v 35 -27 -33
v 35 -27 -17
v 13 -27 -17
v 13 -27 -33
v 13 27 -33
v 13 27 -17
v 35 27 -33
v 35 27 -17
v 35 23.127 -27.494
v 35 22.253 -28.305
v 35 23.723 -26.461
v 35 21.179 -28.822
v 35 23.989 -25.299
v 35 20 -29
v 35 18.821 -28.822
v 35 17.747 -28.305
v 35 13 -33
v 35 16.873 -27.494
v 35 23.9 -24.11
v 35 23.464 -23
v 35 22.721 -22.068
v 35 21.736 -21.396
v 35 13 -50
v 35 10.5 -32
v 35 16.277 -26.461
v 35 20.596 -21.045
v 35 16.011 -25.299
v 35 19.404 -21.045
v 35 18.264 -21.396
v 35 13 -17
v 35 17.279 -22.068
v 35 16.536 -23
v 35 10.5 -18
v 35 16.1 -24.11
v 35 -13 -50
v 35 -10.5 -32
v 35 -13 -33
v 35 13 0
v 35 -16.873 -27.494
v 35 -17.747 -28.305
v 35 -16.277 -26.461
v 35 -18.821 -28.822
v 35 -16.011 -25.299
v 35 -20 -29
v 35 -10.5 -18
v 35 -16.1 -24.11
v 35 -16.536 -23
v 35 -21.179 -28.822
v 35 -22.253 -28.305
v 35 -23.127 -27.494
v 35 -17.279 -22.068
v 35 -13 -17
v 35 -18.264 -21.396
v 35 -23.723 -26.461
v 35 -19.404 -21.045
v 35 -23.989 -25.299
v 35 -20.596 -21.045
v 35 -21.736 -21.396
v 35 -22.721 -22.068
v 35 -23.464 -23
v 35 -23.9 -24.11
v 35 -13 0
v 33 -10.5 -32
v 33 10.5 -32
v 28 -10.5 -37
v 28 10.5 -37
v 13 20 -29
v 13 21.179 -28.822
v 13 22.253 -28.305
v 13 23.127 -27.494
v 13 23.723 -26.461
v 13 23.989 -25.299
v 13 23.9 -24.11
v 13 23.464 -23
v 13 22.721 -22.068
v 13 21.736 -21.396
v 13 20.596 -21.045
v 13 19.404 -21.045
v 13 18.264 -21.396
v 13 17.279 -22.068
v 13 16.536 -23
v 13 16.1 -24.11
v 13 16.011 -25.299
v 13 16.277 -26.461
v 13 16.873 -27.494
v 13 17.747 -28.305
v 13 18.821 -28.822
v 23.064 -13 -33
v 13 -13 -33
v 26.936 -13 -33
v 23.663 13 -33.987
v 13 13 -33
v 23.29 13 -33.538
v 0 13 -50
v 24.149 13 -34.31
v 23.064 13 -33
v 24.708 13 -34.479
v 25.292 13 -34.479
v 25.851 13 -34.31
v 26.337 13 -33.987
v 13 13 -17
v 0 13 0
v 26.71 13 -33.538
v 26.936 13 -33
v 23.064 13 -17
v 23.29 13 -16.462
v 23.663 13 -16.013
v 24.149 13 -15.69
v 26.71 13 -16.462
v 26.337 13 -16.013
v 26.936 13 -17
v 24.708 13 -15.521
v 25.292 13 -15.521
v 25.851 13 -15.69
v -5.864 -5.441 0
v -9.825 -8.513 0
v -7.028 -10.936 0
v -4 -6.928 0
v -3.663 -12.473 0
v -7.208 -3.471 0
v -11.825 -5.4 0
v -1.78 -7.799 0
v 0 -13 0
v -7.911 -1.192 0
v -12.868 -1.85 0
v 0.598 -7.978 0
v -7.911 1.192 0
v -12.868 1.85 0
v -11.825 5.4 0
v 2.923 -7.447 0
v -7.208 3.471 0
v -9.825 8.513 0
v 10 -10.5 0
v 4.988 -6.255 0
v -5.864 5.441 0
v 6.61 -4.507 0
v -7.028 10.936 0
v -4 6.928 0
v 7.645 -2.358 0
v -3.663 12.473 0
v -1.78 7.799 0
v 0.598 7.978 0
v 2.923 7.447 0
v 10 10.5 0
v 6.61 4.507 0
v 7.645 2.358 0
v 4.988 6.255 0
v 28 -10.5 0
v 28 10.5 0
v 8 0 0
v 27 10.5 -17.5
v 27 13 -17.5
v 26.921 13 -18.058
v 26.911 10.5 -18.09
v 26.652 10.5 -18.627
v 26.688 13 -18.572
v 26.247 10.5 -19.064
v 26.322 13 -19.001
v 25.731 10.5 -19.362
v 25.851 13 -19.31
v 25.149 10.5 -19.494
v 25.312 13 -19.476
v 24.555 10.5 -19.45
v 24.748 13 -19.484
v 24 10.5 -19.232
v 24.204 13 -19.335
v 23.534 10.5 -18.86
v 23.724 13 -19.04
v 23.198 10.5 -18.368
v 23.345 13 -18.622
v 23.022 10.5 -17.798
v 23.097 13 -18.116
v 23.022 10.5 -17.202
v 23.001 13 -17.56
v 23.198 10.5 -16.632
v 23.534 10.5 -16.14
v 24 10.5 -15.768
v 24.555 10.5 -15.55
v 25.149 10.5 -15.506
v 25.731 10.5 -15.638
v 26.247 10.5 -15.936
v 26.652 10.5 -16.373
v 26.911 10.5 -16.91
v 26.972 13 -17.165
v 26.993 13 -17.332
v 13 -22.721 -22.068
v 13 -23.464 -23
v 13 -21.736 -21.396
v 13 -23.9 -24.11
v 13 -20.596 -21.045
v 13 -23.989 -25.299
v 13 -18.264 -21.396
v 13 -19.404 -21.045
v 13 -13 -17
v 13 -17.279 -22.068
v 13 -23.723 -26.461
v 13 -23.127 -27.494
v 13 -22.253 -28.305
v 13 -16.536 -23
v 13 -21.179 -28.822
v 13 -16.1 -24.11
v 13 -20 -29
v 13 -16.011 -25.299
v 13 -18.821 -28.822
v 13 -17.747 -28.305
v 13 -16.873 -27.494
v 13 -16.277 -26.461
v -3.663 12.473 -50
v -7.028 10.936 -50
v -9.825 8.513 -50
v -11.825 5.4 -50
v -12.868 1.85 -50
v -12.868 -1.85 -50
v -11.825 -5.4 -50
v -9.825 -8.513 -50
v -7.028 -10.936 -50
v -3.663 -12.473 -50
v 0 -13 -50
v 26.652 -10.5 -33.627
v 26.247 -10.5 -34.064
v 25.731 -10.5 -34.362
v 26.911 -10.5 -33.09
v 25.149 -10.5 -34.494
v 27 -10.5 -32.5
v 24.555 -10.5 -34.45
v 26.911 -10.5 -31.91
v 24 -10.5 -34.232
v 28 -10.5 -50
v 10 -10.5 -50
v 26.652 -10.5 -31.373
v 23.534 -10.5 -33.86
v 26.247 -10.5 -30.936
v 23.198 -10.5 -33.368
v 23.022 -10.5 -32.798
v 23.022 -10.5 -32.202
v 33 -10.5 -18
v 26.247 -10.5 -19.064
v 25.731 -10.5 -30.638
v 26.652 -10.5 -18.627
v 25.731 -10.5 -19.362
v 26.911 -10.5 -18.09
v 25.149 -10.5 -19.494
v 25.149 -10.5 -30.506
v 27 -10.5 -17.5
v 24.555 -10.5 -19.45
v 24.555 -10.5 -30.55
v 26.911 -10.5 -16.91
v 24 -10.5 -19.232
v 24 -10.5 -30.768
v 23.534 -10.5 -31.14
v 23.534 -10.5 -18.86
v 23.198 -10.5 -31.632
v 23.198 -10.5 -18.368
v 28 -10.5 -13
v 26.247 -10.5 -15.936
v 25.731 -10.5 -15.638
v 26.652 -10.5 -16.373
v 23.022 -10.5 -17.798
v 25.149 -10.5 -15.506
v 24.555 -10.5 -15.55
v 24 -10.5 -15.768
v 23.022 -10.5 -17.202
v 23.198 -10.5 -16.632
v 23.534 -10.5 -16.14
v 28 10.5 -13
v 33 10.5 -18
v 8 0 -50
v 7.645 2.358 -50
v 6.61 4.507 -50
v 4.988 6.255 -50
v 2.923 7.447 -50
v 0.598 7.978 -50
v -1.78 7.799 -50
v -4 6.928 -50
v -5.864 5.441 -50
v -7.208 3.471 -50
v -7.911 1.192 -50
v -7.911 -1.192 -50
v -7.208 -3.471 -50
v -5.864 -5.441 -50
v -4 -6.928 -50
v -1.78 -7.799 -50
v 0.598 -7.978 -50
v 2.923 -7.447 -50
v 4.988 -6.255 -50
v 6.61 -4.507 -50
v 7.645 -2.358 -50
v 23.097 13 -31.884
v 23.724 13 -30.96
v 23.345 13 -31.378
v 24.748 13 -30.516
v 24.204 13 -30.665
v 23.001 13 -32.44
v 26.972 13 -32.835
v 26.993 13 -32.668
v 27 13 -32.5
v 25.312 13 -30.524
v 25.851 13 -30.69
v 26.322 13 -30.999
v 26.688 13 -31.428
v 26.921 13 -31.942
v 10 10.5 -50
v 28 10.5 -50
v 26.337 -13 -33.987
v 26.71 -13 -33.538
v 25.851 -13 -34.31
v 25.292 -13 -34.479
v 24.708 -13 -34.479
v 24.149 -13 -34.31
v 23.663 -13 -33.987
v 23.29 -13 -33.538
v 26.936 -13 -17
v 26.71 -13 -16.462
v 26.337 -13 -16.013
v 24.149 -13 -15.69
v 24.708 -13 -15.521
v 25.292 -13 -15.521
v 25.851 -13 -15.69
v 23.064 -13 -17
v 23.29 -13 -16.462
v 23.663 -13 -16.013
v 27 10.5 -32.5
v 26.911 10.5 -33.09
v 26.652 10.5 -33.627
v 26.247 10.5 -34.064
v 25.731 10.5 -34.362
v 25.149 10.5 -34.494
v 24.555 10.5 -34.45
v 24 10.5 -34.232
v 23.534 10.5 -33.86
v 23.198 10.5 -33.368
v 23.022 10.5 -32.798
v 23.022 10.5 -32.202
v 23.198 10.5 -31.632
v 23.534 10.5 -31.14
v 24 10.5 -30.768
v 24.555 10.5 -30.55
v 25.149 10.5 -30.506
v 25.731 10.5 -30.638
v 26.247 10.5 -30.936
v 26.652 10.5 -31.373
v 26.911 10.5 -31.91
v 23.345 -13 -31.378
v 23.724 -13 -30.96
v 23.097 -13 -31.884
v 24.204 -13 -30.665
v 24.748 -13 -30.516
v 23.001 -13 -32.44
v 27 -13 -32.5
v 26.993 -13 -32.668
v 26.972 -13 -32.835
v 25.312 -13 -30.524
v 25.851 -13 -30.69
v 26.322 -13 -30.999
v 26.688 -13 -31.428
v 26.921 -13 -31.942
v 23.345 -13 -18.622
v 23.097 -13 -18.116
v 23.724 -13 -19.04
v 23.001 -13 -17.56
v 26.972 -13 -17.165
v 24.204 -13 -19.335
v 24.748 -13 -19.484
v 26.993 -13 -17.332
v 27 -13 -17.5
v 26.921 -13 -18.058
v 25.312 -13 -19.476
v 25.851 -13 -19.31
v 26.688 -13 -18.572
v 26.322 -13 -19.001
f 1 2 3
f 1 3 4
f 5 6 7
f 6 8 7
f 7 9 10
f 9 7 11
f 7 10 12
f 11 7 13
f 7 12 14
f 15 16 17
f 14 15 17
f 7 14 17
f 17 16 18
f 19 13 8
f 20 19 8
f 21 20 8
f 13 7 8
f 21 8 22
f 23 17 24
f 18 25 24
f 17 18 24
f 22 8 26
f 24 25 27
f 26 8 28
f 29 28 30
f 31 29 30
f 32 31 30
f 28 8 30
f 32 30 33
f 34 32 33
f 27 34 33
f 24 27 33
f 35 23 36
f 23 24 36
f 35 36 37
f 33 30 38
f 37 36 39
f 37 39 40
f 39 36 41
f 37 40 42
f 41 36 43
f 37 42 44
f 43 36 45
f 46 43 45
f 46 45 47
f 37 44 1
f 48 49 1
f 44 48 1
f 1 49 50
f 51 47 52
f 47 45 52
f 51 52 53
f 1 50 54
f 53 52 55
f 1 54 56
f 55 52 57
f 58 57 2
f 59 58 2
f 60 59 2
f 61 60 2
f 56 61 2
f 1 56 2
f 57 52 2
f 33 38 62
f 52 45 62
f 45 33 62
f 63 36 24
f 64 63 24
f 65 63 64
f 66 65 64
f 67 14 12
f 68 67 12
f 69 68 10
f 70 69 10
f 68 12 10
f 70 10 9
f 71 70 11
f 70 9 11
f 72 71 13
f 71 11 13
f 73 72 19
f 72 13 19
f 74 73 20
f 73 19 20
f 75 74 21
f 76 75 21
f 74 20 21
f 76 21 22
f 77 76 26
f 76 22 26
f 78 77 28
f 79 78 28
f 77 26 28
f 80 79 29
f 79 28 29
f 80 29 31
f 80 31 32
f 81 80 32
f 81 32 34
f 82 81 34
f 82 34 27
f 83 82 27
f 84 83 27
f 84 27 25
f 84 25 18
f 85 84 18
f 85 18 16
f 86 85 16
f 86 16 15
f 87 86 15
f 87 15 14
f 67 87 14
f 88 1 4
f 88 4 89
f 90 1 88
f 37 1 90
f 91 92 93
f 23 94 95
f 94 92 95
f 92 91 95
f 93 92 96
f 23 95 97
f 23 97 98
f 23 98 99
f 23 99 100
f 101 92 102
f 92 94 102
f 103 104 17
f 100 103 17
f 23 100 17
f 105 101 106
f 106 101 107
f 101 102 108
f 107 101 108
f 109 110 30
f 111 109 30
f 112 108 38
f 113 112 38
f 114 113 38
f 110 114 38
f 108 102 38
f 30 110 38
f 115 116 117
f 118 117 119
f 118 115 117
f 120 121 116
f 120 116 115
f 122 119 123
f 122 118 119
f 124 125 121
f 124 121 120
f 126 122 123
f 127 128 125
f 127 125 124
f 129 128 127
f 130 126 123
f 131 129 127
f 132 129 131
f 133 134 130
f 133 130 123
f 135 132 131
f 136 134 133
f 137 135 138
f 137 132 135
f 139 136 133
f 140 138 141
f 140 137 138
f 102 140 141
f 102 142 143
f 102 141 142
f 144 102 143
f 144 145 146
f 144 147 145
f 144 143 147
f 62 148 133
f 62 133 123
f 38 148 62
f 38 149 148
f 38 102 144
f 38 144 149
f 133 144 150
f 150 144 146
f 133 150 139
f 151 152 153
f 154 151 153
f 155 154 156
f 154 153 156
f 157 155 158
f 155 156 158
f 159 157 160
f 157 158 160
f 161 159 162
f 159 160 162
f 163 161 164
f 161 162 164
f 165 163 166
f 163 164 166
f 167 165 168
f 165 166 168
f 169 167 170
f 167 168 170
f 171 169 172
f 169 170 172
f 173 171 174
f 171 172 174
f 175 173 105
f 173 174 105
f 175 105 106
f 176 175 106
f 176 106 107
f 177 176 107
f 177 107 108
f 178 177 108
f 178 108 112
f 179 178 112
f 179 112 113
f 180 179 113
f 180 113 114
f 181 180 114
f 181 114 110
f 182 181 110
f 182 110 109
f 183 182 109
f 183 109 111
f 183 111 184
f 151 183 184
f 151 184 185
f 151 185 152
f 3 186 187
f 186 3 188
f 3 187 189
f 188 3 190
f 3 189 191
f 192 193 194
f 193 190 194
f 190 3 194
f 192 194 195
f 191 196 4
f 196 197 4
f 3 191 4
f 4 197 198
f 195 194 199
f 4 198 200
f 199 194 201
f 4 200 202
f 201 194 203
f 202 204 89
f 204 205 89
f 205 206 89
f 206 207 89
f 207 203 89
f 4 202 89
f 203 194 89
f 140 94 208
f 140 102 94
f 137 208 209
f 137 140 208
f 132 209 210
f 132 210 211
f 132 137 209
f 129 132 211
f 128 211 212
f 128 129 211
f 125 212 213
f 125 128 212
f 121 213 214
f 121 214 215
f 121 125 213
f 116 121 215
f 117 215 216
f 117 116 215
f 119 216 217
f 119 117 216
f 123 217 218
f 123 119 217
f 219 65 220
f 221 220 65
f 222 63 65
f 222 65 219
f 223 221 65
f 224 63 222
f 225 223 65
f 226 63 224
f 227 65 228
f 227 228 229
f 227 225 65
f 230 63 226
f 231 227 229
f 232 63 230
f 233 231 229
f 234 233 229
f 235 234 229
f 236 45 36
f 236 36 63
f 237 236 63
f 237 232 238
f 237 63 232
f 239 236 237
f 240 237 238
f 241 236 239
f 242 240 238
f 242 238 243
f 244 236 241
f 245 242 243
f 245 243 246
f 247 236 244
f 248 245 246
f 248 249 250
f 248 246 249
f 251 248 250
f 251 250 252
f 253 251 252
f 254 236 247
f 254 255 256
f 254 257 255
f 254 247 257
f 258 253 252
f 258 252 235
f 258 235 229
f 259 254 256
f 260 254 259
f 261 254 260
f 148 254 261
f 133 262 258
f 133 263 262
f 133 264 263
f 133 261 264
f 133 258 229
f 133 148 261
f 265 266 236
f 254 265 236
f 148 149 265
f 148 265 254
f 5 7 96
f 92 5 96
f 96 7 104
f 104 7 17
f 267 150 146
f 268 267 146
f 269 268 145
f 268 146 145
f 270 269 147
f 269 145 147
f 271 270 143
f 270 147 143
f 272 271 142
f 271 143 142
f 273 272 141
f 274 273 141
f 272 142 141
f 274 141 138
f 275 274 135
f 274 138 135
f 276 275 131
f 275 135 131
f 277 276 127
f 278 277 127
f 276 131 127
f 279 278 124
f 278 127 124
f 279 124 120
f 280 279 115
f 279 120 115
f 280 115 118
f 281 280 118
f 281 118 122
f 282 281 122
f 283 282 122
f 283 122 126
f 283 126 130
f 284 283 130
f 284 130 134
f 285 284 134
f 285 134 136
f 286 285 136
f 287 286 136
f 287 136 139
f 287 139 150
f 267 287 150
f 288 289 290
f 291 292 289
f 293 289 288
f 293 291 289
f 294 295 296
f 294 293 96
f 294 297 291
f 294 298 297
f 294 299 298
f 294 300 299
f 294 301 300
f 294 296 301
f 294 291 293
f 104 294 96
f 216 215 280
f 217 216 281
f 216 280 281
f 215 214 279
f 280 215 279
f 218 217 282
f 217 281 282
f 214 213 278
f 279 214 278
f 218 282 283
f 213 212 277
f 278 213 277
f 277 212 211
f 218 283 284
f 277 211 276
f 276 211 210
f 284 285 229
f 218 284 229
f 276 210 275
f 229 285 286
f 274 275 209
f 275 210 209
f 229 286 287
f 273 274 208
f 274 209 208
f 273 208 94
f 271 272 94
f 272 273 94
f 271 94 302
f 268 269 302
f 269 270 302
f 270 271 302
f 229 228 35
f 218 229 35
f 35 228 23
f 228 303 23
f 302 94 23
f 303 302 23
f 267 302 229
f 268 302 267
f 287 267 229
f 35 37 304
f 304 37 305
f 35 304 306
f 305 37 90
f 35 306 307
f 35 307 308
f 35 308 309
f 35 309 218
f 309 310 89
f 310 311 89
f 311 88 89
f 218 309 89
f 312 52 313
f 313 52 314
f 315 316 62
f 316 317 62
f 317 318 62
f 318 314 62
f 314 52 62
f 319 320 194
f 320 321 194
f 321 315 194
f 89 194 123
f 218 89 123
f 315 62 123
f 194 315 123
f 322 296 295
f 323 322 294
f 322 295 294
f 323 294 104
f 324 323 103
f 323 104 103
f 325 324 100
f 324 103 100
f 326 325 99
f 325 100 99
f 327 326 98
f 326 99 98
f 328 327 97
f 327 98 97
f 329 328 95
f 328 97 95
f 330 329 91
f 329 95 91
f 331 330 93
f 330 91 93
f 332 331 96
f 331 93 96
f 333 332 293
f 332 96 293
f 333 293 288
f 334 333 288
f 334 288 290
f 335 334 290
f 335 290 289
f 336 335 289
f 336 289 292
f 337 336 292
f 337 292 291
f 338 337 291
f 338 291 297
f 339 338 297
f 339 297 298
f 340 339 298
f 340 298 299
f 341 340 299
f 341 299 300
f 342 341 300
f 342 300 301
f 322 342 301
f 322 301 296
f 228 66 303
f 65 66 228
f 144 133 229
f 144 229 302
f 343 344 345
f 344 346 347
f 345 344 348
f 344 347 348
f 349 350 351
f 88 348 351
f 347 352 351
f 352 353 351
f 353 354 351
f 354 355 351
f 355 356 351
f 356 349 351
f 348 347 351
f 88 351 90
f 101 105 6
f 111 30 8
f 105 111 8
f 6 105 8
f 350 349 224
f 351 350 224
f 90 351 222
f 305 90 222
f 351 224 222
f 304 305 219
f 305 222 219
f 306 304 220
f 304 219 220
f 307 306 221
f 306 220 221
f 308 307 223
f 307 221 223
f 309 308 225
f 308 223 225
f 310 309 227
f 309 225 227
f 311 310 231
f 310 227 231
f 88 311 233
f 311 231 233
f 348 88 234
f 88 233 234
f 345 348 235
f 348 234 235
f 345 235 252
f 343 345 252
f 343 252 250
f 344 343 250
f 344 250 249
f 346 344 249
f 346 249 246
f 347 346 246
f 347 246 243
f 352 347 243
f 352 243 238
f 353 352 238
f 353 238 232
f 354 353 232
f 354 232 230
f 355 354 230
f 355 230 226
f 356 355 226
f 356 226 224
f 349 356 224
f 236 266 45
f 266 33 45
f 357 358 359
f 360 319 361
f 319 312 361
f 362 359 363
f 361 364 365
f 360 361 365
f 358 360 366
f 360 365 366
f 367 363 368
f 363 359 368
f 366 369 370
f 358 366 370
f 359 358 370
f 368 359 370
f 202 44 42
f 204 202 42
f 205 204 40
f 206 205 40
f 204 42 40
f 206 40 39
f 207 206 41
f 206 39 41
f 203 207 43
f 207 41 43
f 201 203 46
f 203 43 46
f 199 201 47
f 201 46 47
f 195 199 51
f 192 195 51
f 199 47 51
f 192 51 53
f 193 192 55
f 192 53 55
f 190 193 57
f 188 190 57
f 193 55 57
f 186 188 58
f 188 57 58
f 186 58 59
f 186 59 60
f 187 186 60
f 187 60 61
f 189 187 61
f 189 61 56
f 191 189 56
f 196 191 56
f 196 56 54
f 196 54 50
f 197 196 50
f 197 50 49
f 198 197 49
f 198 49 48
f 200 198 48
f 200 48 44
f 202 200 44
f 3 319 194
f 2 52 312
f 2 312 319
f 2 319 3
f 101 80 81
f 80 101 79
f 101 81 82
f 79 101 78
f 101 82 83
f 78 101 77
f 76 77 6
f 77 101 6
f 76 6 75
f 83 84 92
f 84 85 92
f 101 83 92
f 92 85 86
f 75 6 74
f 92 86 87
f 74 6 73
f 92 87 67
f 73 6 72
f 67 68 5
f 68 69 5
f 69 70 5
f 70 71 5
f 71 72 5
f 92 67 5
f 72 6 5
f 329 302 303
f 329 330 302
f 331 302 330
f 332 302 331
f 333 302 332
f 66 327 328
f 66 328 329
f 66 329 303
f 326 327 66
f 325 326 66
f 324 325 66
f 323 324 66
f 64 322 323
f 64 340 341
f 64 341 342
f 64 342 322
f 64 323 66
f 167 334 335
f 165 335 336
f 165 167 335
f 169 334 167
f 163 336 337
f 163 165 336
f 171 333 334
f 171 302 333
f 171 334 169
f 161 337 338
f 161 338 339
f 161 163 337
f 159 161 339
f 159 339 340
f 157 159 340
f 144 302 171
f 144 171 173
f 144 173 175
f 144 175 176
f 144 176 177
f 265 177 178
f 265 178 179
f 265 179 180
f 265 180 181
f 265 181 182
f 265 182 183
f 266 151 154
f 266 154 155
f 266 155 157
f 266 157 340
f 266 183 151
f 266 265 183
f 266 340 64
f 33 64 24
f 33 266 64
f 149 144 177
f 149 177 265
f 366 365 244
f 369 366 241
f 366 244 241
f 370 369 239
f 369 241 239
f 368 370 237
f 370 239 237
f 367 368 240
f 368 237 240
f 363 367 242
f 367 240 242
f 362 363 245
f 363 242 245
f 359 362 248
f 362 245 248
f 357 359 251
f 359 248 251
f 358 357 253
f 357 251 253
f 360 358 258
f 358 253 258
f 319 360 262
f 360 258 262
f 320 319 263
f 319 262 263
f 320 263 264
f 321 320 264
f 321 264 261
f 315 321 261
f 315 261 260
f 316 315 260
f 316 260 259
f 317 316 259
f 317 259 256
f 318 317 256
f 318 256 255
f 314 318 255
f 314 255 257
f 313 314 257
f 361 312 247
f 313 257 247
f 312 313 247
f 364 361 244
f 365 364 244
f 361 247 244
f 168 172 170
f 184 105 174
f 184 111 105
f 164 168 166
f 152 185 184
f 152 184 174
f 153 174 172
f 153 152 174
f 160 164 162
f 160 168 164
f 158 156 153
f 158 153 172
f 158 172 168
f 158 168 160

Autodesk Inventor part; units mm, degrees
ref_plane "YZ Plane" through (0, 0, 0) normal (1, 0, 0) x (0, 1, 0)
ref_plane "XZ Plane" through (0, 0, 0) normal (0, 1, 0) x (-1, 0, 0)
ref_plane "XY Plane" through (0, 0, 0) normal (0, 0, 1) x (1, 0, 0)
sketch "Sketch1" plane through (0, 0, 0) normal (0, 0, 1) x (1, 0, 0)
  circle A0 centre (0, 0) radius 8
  circle A1 centre (0, 0) radius 13
  line L0 (0, 13) -> (35, 13)
  line L1 (35, 13) -> (35, -13)
  line L2 (35, -13) -> (0, -13)
  dimension "d0" = 16
  dimension "d1" = 26
  dimension "d2" = 48
extrude "Extrusion1" add sketch "Sketch1" against normal blind 50
sketch "Sketch2" plane through (0, 0, 0) normal (0, 0, 1) x (1, 0, 0)
  circle A0 centre (0, 0) radius 8 projected
  line L0 (35, 13) -> (0, 13) projected
  line L1 (10, 10.5) -> (28, 10.5)
  line L2 (28, 10.5) -> (28, -10.5)
  line L3 (28, -10.5) -> (10, -10.5)
  line L4 (10, -10.5) -> (10, 10.5)
  dimension "d5" = 18
  dimension "d6" = 21
  dimension "d7" = 10
  dimension "d8" = 2.5
extrude "Extrusion2" cut sketch "Sketch2" against normal up to surface (50 mm away) contours L1 L2 L3 L4
sketch "Sketch3" plane through (0, 13, 0) normal (0, 1, 0) x (1, 0, 0)
  line L0 (0, 50) -> (35, 50) projected
  line L1 (0, 0) -> (0, 50) projected
  circle A0 centre (25, 32.5) radius 2
  circle A1 centre (25, 17.5) radius 2
  line L2 (-8, 50) -> (8, 50) projected
  line L3 (8, 0) -> (-8, 0) projected
  dimension "d11" = 4
  dimension "d12" = 4
  dimension "d13" = 15
  dimension "d14" = 25
  dimension "d15" = 17.5
extrude "Extrusion3" cut sketch "Sketch3" along normal blind 50 and the other way blind 29.25
sketch "Sketch4" plane through (35, -13, 0) normal (1, 0, 0) x (0, 0, -1)
  line L0 (0, 0) -> (0, 26) projected
  line L1 (0, 0) -> (50, 0) projected
  line L2 (18, 2.5) -> (32, 2.5)
  line L3 (32, 2.5) -> (32, 23.5)
  line L4 (32, 23.5) -> (18, 23.5)
  line L5 (18, 23.5) -> (18, 2.5)
  point P0 (0, 13)
  dimension "d20" = 14
  dimension "d21" = 21
  dimension "d22" = 18
  dimension "d23" = 2.5
extrude "Extrusion4" cut sketch "Sketch4" against normal up to surface (7 mm away)
chamfer "Chamfer1" distance 5 angle 45 2 edges at (28, 0, -32) (28, 0, -18)
sketch "Sketch5" plane through (35, -13, 0) normal (1, 0, 0) x (0, 0, -1)
  line L0 (0, 0) -> (50, 0) projected
  line L1 (50, 26) -> (50, 0) projected
  line L2 (0, 26) -> (50, 26) projected
  circle A0 centre (25, 33) radius 4
  circle A1 centre (25, -7) radius 4
  line L3 (0, 26) -> (50, 26) projected
  line L4 (17, 26) -> (17, 40)
  line L5 (17, 40) -> (33, 40)
  line L6 (33, 40) -> (33, 26)
  line L7 (0, 0) -> (50, 0) projected
  line L8 (17, 0) -> (17, -14)
  line L9 (17, -14) -> (33, -14)
  line L10 (33, -14) -> (33, 0)
  point P0 (0, 13)
  dimension "d29" = 8
  dimension "d30" = 8
  dimension "d31" = 25
  dimension "d32" = 40
  dimension "d33" = 7
  dimension "d34" = 14
  dimension "d35" = 14
  dimension "d36" = 8
  dimension "d37" = 8
extrude "Extrusion5" add sketch "Sketch5" against normal blind 22
properties part number "XEndTop"
